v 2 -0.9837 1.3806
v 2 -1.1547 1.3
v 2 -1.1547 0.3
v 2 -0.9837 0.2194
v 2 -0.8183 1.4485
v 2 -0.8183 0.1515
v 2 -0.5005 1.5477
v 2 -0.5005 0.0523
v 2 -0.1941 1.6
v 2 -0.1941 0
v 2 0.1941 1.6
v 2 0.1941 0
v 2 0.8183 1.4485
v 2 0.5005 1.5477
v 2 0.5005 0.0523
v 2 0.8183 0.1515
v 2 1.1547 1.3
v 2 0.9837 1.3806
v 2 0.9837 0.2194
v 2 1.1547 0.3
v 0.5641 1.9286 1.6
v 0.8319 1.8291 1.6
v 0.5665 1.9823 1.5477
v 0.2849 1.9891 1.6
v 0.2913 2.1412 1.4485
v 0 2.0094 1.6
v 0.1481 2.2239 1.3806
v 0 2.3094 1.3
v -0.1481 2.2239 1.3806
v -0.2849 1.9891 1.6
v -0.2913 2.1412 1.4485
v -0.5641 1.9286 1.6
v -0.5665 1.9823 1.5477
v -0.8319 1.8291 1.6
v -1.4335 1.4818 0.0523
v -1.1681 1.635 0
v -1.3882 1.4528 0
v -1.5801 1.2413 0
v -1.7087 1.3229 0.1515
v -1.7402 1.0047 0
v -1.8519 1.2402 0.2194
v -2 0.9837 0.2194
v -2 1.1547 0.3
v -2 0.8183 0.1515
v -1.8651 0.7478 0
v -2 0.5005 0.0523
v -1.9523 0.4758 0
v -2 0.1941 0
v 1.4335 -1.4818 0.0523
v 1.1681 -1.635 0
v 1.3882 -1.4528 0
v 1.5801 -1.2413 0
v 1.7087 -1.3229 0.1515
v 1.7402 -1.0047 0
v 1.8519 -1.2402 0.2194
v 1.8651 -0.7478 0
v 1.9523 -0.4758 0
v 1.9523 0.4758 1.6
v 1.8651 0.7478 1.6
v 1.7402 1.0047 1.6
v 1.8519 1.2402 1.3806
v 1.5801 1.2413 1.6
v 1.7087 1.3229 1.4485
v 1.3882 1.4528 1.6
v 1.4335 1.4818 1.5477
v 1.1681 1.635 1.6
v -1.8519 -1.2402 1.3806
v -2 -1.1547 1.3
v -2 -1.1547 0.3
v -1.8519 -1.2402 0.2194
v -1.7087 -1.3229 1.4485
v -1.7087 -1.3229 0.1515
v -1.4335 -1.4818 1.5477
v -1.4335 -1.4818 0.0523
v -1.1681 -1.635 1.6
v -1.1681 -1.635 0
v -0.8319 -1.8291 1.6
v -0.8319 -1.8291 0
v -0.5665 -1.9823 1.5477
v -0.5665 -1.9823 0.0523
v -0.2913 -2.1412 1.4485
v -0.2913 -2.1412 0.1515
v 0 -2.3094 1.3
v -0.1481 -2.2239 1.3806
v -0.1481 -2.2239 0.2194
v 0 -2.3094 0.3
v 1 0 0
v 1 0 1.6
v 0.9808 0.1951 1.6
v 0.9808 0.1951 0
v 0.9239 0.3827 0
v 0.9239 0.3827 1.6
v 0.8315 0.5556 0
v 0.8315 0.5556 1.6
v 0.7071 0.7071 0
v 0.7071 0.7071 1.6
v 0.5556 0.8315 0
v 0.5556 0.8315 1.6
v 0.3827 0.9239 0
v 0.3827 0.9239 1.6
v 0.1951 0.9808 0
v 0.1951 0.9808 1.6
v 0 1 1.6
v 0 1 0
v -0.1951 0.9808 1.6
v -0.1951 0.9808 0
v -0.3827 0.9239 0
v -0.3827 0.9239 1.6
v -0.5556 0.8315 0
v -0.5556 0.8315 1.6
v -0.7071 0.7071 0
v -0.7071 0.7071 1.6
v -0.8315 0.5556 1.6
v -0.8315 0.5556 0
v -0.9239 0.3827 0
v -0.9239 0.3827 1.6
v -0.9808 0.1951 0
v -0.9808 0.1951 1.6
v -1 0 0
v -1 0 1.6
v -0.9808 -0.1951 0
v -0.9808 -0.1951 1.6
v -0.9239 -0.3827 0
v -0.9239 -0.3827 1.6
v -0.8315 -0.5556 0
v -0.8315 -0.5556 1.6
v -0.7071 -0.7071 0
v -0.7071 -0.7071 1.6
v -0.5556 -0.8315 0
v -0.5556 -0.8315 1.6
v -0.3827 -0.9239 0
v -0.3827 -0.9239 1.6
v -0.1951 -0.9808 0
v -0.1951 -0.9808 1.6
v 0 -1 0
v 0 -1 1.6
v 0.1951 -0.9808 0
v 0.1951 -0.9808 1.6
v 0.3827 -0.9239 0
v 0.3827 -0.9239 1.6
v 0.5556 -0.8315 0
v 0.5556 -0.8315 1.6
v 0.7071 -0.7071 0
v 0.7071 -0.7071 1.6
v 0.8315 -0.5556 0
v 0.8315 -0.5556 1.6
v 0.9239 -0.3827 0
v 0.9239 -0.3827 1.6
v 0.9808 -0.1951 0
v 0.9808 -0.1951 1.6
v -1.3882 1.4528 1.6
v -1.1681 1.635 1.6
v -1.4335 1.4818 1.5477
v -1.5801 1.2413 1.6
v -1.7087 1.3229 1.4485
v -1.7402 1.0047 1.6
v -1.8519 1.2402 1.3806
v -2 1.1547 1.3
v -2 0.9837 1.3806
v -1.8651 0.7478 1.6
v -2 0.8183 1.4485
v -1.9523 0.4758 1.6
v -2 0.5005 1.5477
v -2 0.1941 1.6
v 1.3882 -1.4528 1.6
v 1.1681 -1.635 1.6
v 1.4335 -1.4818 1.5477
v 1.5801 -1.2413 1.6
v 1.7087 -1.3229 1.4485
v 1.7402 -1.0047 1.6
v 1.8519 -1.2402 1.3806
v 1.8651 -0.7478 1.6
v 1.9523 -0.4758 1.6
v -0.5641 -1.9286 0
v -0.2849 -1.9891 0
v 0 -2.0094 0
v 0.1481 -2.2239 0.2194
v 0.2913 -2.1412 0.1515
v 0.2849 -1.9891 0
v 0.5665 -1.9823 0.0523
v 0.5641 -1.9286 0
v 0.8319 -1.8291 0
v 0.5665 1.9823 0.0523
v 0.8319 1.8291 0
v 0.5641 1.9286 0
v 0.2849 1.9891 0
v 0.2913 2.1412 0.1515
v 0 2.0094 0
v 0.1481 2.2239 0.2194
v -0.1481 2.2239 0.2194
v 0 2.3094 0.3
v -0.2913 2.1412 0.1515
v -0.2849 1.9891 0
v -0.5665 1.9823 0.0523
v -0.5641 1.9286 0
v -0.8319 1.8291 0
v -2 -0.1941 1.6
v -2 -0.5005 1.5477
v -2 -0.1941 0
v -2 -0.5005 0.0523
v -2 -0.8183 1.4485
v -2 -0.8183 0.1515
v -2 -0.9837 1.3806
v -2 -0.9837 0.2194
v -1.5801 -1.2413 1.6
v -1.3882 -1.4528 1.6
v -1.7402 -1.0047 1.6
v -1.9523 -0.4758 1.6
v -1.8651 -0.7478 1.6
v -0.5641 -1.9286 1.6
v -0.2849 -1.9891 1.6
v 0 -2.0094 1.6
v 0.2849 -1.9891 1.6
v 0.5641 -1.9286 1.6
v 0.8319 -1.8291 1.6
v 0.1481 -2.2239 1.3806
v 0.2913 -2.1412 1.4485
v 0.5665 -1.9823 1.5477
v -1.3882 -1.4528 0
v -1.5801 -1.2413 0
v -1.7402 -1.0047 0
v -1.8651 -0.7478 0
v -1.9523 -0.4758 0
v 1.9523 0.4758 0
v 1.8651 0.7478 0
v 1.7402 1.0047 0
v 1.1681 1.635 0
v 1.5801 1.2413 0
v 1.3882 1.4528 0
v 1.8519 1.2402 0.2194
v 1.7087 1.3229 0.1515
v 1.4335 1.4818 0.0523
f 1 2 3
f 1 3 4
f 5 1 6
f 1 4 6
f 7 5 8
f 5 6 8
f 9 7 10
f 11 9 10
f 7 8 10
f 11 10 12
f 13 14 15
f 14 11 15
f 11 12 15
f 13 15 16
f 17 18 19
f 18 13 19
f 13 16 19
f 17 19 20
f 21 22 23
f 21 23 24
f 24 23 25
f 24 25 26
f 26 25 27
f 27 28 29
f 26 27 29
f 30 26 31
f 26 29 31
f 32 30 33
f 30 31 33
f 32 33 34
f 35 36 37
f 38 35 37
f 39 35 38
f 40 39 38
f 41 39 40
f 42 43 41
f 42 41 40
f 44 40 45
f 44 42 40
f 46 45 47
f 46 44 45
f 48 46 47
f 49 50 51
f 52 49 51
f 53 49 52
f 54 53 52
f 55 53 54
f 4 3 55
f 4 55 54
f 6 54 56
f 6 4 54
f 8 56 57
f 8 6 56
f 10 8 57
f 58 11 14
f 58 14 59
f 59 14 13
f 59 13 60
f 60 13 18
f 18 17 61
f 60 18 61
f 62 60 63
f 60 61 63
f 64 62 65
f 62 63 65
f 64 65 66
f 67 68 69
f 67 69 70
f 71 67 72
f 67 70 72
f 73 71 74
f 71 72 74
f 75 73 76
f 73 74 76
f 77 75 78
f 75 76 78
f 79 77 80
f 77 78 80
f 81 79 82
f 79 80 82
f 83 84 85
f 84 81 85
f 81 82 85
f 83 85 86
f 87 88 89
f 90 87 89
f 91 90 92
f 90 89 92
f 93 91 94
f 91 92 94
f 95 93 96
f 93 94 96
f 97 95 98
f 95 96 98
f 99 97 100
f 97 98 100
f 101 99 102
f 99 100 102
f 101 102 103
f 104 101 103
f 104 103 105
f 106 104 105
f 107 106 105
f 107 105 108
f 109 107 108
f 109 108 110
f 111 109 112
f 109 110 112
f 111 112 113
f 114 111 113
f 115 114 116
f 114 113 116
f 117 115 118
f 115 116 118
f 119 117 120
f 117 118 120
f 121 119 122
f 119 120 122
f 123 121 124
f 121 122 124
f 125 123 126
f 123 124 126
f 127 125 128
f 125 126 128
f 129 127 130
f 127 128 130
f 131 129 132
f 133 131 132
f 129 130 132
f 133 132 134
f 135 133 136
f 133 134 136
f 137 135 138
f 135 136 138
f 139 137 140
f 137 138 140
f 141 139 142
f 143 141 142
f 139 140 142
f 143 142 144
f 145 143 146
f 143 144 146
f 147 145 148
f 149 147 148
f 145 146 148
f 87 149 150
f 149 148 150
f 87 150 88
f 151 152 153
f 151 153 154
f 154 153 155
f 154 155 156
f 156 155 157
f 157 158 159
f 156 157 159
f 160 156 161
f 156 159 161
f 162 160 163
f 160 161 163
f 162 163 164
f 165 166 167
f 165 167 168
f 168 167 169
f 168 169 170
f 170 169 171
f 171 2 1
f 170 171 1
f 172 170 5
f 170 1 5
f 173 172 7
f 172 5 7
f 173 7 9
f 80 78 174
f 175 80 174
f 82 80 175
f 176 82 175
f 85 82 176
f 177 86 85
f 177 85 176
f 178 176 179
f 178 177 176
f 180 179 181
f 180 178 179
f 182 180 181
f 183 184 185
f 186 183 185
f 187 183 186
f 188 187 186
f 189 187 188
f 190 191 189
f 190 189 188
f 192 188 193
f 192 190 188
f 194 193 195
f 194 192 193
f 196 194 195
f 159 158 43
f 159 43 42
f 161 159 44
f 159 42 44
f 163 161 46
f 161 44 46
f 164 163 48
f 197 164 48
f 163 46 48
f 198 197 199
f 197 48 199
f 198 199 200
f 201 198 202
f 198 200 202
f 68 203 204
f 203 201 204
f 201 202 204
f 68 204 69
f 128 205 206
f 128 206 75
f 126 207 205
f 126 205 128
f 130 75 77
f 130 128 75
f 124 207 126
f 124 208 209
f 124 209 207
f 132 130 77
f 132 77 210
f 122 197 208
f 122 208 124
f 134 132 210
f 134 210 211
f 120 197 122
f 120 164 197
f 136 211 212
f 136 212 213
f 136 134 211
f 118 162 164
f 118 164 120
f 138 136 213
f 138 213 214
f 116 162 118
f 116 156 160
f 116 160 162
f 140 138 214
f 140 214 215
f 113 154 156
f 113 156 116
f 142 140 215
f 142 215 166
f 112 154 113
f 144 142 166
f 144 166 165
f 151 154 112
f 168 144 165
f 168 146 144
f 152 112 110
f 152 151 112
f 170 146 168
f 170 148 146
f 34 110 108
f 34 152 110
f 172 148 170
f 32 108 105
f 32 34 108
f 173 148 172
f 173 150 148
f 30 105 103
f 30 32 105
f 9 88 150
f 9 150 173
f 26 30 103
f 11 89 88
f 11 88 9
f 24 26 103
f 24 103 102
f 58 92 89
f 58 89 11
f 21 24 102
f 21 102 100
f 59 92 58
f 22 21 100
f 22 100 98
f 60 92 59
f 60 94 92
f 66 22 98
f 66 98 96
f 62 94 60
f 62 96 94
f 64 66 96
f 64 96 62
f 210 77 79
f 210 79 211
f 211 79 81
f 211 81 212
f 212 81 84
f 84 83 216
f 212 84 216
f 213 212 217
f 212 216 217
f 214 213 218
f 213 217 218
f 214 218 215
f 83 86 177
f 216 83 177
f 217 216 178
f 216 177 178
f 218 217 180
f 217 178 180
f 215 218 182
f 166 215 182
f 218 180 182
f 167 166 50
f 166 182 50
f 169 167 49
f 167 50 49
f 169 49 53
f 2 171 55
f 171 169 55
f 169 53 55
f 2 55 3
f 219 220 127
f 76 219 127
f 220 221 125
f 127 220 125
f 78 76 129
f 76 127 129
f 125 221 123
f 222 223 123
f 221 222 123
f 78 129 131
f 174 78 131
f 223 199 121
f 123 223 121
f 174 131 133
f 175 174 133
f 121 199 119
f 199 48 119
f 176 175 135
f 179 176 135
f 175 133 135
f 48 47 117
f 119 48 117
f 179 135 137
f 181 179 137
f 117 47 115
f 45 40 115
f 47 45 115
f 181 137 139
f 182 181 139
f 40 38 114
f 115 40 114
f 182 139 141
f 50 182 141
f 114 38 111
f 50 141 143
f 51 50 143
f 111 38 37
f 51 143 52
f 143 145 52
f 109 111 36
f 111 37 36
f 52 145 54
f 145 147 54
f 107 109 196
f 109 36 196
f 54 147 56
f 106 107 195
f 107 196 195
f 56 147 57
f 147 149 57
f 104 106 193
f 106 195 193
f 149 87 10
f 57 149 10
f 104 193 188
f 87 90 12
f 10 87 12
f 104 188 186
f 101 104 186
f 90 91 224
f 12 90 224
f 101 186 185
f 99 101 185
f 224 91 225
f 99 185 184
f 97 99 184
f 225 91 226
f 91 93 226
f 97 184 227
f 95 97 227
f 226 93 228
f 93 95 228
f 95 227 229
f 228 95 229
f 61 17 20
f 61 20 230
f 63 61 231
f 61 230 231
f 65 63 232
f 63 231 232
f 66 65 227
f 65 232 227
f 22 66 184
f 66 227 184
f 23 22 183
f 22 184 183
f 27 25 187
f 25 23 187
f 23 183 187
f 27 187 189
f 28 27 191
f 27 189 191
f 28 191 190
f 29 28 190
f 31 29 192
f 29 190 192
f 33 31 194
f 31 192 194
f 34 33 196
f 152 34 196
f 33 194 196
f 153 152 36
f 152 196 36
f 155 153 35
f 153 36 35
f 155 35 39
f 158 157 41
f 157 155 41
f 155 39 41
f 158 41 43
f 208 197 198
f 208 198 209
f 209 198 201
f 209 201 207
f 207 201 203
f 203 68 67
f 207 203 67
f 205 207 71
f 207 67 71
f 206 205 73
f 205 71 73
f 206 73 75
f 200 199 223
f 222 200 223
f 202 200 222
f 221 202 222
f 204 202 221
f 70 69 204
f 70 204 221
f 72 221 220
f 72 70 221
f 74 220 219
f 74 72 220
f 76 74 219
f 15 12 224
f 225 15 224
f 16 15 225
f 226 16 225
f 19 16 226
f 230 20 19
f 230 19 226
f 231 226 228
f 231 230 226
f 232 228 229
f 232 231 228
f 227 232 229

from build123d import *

# Parameters (mm, degrees)
EXTRUDE_1_DEPTH     = 1.6
SKETCH_6_R          = 1
CUT_EXTRUDE_1_DEPTH = 1.6


with BuildPart() as part:
    # 草图3 → 凸台-拉伸1 (new body)
    with BuildSketch(Plane.XY):
        Polygon((2, 1.154700538), (0, 2.309401077), (-2, 1.154700538), (-2, -1.154700538), (0, -2.309401077), (2, -1.154700538), align=None)
    extrude(amount=EXTRUDE_1_DEPTH)

    # 草图5 → 切除-旋转1 (revolve, cut)
    with BuildSketch(Plane(origin=(0, 0, 0), x_dir=(0, 0, -1), z_dir=(1, 0, 0))):
        Polygon((-1.3, 2.309401077), (-1.6, 2.309401077), (-1.6, 2.009401077), align=None)
        Polygon((0, 2.009401077), (-0.3, 2.309401077), (0, 2.309401077), align=None)
    revolve(axis=Axis((0, 0, 0), (0, 0, 1)), mode=Mode.SUBTRACT)

    # 草图6 → 切除-拉伸1 (cut)
    with BuildSketch(Plane.XY.offset(1.6)):
        Circle(SKETCH_6_R)
    extrude(amount=-CUT_EXTRUDE_1_DEPTH, mode=Mode.SUBTRACT)


solid = part.part
